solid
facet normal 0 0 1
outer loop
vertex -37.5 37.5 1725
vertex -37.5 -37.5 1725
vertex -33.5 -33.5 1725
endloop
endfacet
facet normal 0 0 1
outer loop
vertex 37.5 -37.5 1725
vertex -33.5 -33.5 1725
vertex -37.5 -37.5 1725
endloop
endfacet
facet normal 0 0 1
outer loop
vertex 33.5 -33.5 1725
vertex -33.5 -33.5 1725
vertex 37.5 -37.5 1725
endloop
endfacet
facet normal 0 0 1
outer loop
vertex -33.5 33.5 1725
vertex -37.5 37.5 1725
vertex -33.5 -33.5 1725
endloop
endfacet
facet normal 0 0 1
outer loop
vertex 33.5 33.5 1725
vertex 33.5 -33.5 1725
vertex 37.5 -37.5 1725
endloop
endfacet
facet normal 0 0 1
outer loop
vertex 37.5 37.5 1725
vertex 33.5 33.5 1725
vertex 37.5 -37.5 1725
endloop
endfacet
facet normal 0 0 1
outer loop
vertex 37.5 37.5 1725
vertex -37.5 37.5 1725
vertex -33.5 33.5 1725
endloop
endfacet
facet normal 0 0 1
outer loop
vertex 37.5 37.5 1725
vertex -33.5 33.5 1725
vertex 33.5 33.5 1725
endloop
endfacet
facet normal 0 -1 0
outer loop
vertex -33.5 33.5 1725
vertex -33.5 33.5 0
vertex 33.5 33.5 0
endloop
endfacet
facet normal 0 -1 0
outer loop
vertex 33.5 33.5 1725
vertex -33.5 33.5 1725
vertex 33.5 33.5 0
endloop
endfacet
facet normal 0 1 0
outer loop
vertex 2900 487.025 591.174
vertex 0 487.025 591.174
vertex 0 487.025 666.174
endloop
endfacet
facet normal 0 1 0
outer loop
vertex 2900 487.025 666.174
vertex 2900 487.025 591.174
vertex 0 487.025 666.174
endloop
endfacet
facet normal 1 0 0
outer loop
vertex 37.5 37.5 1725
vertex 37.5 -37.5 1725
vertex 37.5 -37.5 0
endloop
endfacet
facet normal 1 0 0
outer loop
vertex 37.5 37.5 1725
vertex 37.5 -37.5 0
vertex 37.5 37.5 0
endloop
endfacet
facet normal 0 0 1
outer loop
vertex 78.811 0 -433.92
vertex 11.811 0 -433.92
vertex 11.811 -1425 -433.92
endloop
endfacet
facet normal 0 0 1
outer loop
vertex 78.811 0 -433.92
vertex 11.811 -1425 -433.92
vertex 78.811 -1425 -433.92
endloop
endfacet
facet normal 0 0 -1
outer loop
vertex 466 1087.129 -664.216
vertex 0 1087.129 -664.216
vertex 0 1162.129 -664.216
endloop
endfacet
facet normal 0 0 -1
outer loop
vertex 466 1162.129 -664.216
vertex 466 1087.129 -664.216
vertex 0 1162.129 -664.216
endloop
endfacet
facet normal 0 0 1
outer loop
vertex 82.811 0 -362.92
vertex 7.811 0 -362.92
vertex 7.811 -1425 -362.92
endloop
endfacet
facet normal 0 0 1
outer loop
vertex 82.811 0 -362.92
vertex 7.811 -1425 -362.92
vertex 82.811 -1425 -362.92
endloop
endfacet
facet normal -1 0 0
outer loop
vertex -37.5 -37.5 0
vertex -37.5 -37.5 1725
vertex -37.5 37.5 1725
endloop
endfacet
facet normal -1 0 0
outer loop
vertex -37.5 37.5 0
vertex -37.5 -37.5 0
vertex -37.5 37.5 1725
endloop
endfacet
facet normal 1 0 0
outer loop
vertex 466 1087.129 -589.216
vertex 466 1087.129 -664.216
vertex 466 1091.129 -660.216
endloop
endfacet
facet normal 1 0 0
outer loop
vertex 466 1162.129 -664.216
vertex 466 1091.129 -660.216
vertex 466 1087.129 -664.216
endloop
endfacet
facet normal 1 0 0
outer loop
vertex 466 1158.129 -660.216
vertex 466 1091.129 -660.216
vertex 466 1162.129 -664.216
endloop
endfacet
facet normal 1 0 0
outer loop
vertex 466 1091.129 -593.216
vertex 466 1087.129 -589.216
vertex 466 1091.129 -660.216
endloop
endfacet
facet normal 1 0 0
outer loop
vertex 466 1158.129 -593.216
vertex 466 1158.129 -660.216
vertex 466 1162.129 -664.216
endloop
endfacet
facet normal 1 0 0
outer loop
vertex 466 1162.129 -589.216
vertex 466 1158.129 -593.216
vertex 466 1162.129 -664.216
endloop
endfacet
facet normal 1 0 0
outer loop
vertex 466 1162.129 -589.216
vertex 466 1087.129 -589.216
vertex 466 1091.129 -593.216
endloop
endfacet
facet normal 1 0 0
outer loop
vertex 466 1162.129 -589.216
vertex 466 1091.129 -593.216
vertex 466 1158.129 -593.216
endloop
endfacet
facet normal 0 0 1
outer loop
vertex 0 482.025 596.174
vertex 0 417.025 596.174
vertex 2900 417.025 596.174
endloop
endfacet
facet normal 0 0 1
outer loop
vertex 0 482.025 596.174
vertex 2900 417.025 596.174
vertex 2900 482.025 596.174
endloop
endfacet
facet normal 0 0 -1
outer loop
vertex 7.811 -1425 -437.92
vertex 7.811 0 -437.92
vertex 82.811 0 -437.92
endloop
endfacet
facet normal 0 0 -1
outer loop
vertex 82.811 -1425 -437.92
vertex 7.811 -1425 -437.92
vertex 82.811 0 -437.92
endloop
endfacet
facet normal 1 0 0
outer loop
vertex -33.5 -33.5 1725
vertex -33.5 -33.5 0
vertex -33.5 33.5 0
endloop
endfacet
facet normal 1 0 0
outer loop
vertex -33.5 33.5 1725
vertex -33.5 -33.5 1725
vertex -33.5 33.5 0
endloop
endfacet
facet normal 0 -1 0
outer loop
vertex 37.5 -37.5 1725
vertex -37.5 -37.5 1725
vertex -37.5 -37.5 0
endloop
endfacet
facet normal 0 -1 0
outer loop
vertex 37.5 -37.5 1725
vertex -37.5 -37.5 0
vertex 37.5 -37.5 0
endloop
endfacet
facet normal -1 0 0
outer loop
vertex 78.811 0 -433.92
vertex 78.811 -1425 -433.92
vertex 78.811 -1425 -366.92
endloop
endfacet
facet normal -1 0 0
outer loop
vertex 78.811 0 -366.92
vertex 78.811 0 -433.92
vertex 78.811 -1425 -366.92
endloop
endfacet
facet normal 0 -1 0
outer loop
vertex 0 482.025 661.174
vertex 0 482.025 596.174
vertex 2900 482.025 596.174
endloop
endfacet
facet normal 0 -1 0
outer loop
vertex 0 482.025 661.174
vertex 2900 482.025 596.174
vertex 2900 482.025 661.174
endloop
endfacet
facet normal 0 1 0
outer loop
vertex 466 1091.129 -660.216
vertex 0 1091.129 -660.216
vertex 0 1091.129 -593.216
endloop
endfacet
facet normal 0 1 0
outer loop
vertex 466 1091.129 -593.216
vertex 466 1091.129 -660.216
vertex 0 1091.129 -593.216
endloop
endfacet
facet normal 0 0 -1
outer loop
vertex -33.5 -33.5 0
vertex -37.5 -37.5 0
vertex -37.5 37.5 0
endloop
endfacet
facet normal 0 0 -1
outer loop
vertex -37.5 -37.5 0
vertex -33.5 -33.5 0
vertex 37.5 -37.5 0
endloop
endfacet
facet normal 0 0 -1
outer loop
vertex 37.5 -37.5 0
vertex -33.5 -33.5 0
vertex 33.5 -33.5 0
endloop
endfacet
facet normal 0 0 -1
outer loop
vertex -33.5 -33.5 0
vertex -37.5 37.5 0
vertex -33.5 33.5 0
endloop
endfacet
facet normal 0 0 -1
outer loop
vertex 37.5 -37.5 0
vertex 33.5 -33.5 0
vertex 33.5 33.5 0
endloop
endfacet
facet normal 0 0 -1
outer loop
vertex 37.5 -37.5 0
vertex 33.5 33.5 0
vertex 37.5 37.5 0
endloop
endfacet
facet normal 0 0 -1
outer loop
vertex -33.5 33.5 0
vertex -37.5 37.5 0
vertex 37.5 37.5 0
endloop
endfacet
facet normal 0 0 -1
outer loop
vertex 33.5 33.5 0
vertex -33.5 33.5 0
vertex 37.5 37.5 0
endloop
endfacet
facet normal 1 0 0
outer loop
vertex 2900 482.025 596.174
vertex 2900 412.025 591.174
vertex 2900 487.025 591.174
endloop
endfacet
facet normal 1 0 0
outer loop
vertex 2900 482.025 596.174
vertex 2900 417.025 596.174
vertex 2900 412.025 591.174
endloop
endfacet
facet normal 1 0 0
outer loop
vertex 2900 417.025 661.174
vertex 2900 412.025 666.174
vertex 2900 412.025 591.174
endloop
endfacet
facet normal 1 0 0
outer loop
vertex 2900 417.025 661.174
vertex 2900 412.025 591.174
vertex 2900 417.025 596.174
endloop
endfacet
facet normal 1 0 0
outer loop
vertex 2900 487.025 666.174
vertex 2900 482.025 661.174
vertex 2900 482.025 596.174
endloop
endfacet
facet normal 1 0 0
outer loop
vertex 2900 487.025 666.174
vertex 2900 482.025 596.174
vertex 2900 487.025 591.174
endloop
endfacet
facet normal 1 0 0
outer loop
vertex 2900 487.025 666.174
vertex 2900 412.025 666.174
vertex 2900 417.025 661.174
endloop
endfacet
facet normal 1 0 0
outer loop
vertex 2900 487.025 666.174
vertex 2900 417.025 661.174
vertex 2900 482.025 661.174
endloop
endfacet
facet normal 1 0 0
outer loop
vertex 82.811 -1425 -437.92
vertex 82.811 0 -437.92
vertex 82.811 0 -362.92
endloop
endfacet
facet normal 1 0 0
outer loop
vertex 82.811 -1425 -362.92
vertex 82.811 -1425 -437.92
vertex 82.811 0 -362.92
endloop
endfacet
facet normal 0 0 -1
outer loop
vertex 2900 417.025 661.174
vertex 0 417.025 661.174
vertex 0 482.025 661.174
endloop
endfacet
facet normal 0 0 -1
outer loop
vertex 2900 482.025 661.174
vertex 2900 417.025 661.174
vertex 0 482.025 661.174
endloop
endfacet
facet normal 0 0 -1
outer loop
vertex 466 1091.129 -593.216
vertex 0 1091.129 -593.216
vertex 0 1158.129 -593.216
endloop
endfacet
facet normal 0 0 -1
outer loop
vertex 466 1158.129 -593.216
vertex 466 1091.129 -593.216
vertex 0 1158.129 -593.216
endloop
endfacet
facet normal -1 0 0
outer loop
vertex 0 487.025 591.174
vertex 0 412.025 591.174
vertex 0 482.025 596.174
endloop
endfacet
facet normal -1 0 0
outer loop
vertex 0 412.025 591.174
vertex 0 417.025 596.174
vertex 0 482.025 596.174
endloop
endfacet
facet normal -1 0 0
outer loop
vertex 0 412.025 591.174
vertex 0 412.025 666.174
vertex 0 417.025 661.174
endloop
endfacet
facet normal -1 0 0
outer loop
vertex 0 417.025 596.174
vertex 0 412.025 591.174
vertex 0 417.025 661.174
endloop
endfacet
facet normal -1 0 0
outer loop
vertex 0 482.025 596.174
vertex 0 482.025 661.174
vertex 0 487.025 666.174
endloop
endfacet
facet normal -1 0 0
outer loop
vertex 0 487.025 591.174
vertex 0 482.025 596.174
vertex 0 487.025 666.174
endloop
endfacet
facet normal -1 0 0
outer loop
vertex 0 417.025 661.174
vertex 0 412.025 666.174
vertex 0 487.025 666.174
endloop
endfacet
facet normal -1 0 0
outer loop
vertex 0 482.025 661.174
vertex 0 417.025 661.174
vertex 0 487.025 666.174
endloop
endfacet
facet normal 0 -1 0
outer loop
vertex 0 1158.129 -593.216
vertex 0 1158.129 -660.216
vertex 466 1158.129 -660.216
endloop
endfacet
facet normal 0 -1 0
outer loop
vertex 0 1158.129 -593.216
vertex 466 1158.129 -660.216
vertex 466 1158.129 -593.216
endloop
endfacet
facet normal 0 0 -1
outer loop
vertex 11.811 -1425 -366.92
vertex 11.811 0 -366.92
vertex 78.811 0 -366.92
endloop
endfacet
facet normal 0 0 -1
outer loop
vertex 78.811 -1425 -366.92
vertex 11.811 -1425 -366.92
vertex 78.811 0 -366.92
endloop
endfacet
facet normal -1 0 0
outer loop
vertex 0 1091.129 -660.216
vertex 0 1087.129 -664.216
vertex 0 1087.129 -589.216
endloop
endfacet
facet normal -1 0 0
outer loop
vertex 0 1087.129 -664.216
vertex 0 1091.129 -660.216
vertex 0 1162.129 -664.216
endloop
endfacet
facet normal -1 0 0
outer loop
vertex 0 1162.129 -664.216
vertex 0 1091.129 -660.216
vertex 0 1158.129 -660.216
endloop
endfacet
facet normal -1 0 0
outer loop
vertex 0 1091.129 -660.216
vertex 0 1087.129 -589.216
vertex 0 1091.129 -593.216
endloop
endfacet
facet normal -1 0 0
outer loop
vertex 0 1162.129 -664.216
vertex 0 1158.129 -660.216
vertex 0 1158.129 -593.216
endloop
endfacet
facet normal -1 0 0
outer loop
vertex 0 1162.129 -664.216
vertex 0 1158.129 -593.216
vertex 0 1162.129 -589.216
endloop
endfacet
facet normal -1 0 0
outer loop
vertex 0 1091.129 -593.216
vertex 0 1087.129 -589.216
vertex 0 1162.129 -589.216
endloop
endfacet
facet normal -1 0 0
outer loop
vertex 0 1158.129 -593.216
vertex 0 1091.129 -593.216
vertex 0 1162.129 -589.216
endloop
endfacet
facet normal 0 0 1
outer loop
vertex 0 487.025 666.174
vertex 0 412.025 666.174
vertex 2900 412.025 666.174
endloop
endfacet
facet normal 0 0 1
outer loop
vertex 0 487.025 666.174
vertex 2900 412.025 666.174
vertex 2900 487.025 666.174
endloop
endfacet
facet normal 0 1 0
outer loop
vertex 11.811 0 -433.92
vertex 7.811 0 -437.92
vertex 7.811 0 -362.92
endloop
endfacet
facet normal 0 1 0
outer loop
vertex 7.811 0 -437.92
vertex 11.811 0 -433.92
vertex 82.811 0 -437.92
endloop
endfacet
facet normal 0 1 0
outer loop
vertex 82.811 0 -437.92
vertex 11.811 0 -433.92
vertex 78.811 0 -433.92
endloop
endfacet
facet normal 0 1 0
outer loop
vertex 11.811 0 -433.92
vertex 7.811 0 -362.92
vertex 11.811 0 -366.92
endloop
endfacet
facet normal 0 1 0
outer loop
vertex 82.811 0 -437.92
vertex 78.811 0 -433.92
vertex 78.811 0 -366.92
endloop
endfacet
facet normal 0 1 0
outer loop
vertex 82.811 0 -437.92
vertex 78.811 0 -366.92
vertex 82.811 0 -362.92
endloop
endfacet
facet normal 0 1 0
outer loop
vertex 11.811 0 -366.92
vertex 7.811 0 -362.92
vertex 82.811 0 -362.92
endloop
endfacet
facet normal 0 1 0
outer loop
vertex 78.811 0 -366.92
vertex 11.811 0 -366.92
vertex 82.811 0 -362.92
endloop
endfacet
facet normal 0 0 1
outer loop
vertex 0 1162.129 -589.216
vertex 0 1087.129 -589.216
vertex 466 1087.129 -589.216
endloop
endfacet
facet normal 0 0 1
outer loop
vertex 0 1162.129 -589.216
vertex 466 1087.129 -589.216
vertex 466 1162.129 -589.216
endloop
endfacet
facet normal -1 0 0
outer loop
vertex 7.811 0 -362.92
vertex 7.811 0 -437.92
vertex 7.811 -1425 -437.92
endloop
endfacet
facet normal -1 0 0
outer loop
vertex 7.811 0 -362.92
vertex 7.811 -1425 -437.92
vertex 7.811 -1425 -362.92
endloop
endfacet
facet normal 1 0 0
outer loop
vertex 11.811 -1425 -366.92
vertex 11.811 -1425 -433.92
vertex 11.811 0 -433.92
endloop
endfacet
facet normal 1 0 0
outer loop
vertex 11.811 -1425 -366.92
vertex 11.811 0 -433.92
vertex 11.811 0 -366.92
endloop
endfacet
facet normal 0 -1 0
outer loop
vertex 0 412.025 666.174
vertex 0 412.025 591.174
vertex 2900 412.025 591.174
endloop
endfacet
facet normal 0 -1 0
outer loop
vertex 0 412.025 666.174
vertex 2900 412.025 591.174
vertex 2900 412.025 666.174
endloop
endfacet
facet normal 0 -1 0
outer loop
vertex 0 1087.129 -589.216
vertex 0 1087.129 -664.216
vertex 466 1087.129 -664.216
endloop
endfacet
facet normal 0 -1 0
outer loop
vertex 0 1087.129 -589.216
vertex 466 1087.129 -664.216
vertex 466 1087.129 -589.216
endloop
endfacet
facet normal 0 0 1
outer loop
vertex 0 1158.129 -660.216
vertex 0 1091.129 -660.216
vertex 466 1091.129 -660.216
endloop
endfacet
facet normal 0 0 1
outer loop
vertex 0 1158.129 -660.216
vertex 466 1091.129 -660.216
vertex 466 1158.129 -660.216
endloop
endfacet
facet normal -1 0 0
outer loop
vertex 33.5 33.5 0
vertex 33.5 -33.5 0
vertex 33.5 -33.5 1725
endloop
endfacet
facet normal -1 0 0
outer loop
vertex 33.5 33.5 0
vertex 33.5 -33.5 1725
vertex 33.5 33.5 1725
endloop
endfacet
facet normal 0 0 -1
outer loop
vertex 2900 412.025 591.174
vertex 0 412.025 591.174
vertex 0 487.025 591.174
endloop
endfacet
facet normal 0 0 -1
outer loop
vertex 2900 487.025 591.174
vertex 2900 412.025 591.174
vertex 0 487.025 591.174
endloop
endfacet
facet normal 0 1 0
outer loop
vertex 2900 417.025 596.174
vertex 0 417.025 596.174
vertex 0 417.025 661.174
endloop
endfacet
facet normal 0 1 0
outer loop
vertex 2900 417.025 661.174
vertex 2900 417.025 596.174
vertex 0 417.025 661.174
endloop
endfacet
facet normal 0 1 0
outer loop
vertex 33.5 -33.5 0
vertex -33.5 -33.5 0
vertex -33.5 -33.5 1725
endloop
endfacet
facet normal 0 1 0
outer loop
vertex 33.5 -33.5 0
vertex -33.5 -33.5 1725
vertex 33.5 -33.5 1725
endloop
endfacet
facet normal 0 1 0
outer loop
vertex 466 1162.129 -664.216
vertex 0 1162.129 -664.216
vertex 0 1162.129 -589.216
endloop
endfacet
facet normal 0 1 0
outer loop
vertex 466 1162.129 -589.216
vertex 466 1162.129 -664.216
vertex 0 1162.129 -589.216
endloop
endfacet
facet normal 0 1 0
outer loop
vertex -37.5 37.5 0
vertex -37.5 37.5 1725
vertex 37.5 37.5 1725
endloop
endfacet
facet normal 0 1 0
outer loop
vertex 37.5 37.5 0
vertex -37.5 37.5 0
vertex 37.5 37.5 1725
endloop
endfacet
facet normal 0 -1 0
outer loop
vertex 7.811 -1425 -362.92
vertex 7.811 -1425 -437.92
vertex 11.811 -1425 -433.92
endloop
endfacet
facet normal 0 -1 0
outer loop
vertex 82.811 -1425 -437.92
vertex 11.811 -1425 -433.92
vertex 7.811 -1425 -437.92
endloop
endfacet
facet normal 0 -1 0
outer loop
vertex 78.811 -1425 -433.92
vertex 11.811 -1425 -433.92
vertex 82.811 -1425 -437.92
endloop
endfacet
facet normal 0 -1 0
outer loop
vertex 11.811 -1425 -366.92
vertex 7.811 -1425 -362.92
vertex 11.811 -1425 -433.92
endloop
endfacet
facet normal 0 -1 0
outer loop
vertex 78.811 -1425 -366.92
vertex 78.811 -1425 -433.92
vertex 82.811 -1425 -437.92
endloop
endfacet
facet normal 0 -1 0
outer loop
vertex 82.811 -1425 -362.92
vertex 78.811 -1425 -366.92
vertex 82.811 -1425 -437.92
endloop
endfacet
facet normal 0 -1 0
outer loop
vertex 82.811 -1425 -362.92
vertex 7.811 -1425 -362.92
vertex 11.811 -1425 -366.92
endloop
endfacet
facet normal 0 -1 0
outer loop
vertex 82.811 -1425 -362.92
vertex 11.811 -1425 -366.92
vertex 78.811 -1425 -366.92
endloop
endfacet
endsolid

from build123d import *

# Parameters (mm, degrees)
F0_W     = 75
F0_H     = 75
F0_W_2   = 67
F0_H_2   = 67
F1_DEPTH = 1725
F2_W     = 75
F2_H     = 75
F2_W_2   = 65
F2_H_2   = 65
F3_DEPTH = 2900
F4_W     = 75
F4_H     = 75
F4_W_2   = 67
F4_H_2   = 67
F5_DEPTH = 1425
F6_W     = 75
F6_H     = 75
F6_W_2   = 67
F6_H_2   = 67
F7_DEPTH = 466


with BuildPart() as f1:
    # F0 (on Top) → F1 (new body)
    with BuildSketch(Plane.XY):
        Rectangle(F0_W, F0_H)
        Rectangle(F0_W_2, F0_H_2, mode=Mode.SUBTRACT)
    extrude(amount=F1_DEPTH)


with BuildPart() as f3:
    # F2 (on Right) → F3 (new body)
    with BuildSketch(Plane.YZ):
        with Locations((449.524915, 628.674006)):
            Rectangle(F2_W, F2_H)
        with Locations((449.524915, 628.674006)):
            Rectangle(F2_W_2, F2_H_2, mode=Mode.SUBTRACT)
    extrude(amount=F3_DEPTH)


with BuildPart() as f5:
    # F4 (on Front) → F5 (new body)
    with BuildSketch(Plane.XZ):
        with Locations((45.311397, -400.419766)):
            Rectangle(F4_W, F4_H)
        with Locations((45.311397, -400.419766)):
            Rectangle(F4_W_2, F4_H_2, mode=Mode.SUBTRACT)
    extrude(amount=F5_DEPTH)


with BuildPart() as f7:
    # F6 (on Right) → F7 (new body)
    with BuildSketch(Plane.YZ):
        with Locations((1124.628758, -626.71628)):
            Rectangle(F6_W, F6_H)
        with Locations((1124.628758, -626.71628)):
            Rectangle(F6_W_2, F6_H_2, mode=Mode.SUBTRACT)
    extrude(amount=F7_DEPTH)


solid = Compound([f1.part, f3.part, f5.part, f7.part])
